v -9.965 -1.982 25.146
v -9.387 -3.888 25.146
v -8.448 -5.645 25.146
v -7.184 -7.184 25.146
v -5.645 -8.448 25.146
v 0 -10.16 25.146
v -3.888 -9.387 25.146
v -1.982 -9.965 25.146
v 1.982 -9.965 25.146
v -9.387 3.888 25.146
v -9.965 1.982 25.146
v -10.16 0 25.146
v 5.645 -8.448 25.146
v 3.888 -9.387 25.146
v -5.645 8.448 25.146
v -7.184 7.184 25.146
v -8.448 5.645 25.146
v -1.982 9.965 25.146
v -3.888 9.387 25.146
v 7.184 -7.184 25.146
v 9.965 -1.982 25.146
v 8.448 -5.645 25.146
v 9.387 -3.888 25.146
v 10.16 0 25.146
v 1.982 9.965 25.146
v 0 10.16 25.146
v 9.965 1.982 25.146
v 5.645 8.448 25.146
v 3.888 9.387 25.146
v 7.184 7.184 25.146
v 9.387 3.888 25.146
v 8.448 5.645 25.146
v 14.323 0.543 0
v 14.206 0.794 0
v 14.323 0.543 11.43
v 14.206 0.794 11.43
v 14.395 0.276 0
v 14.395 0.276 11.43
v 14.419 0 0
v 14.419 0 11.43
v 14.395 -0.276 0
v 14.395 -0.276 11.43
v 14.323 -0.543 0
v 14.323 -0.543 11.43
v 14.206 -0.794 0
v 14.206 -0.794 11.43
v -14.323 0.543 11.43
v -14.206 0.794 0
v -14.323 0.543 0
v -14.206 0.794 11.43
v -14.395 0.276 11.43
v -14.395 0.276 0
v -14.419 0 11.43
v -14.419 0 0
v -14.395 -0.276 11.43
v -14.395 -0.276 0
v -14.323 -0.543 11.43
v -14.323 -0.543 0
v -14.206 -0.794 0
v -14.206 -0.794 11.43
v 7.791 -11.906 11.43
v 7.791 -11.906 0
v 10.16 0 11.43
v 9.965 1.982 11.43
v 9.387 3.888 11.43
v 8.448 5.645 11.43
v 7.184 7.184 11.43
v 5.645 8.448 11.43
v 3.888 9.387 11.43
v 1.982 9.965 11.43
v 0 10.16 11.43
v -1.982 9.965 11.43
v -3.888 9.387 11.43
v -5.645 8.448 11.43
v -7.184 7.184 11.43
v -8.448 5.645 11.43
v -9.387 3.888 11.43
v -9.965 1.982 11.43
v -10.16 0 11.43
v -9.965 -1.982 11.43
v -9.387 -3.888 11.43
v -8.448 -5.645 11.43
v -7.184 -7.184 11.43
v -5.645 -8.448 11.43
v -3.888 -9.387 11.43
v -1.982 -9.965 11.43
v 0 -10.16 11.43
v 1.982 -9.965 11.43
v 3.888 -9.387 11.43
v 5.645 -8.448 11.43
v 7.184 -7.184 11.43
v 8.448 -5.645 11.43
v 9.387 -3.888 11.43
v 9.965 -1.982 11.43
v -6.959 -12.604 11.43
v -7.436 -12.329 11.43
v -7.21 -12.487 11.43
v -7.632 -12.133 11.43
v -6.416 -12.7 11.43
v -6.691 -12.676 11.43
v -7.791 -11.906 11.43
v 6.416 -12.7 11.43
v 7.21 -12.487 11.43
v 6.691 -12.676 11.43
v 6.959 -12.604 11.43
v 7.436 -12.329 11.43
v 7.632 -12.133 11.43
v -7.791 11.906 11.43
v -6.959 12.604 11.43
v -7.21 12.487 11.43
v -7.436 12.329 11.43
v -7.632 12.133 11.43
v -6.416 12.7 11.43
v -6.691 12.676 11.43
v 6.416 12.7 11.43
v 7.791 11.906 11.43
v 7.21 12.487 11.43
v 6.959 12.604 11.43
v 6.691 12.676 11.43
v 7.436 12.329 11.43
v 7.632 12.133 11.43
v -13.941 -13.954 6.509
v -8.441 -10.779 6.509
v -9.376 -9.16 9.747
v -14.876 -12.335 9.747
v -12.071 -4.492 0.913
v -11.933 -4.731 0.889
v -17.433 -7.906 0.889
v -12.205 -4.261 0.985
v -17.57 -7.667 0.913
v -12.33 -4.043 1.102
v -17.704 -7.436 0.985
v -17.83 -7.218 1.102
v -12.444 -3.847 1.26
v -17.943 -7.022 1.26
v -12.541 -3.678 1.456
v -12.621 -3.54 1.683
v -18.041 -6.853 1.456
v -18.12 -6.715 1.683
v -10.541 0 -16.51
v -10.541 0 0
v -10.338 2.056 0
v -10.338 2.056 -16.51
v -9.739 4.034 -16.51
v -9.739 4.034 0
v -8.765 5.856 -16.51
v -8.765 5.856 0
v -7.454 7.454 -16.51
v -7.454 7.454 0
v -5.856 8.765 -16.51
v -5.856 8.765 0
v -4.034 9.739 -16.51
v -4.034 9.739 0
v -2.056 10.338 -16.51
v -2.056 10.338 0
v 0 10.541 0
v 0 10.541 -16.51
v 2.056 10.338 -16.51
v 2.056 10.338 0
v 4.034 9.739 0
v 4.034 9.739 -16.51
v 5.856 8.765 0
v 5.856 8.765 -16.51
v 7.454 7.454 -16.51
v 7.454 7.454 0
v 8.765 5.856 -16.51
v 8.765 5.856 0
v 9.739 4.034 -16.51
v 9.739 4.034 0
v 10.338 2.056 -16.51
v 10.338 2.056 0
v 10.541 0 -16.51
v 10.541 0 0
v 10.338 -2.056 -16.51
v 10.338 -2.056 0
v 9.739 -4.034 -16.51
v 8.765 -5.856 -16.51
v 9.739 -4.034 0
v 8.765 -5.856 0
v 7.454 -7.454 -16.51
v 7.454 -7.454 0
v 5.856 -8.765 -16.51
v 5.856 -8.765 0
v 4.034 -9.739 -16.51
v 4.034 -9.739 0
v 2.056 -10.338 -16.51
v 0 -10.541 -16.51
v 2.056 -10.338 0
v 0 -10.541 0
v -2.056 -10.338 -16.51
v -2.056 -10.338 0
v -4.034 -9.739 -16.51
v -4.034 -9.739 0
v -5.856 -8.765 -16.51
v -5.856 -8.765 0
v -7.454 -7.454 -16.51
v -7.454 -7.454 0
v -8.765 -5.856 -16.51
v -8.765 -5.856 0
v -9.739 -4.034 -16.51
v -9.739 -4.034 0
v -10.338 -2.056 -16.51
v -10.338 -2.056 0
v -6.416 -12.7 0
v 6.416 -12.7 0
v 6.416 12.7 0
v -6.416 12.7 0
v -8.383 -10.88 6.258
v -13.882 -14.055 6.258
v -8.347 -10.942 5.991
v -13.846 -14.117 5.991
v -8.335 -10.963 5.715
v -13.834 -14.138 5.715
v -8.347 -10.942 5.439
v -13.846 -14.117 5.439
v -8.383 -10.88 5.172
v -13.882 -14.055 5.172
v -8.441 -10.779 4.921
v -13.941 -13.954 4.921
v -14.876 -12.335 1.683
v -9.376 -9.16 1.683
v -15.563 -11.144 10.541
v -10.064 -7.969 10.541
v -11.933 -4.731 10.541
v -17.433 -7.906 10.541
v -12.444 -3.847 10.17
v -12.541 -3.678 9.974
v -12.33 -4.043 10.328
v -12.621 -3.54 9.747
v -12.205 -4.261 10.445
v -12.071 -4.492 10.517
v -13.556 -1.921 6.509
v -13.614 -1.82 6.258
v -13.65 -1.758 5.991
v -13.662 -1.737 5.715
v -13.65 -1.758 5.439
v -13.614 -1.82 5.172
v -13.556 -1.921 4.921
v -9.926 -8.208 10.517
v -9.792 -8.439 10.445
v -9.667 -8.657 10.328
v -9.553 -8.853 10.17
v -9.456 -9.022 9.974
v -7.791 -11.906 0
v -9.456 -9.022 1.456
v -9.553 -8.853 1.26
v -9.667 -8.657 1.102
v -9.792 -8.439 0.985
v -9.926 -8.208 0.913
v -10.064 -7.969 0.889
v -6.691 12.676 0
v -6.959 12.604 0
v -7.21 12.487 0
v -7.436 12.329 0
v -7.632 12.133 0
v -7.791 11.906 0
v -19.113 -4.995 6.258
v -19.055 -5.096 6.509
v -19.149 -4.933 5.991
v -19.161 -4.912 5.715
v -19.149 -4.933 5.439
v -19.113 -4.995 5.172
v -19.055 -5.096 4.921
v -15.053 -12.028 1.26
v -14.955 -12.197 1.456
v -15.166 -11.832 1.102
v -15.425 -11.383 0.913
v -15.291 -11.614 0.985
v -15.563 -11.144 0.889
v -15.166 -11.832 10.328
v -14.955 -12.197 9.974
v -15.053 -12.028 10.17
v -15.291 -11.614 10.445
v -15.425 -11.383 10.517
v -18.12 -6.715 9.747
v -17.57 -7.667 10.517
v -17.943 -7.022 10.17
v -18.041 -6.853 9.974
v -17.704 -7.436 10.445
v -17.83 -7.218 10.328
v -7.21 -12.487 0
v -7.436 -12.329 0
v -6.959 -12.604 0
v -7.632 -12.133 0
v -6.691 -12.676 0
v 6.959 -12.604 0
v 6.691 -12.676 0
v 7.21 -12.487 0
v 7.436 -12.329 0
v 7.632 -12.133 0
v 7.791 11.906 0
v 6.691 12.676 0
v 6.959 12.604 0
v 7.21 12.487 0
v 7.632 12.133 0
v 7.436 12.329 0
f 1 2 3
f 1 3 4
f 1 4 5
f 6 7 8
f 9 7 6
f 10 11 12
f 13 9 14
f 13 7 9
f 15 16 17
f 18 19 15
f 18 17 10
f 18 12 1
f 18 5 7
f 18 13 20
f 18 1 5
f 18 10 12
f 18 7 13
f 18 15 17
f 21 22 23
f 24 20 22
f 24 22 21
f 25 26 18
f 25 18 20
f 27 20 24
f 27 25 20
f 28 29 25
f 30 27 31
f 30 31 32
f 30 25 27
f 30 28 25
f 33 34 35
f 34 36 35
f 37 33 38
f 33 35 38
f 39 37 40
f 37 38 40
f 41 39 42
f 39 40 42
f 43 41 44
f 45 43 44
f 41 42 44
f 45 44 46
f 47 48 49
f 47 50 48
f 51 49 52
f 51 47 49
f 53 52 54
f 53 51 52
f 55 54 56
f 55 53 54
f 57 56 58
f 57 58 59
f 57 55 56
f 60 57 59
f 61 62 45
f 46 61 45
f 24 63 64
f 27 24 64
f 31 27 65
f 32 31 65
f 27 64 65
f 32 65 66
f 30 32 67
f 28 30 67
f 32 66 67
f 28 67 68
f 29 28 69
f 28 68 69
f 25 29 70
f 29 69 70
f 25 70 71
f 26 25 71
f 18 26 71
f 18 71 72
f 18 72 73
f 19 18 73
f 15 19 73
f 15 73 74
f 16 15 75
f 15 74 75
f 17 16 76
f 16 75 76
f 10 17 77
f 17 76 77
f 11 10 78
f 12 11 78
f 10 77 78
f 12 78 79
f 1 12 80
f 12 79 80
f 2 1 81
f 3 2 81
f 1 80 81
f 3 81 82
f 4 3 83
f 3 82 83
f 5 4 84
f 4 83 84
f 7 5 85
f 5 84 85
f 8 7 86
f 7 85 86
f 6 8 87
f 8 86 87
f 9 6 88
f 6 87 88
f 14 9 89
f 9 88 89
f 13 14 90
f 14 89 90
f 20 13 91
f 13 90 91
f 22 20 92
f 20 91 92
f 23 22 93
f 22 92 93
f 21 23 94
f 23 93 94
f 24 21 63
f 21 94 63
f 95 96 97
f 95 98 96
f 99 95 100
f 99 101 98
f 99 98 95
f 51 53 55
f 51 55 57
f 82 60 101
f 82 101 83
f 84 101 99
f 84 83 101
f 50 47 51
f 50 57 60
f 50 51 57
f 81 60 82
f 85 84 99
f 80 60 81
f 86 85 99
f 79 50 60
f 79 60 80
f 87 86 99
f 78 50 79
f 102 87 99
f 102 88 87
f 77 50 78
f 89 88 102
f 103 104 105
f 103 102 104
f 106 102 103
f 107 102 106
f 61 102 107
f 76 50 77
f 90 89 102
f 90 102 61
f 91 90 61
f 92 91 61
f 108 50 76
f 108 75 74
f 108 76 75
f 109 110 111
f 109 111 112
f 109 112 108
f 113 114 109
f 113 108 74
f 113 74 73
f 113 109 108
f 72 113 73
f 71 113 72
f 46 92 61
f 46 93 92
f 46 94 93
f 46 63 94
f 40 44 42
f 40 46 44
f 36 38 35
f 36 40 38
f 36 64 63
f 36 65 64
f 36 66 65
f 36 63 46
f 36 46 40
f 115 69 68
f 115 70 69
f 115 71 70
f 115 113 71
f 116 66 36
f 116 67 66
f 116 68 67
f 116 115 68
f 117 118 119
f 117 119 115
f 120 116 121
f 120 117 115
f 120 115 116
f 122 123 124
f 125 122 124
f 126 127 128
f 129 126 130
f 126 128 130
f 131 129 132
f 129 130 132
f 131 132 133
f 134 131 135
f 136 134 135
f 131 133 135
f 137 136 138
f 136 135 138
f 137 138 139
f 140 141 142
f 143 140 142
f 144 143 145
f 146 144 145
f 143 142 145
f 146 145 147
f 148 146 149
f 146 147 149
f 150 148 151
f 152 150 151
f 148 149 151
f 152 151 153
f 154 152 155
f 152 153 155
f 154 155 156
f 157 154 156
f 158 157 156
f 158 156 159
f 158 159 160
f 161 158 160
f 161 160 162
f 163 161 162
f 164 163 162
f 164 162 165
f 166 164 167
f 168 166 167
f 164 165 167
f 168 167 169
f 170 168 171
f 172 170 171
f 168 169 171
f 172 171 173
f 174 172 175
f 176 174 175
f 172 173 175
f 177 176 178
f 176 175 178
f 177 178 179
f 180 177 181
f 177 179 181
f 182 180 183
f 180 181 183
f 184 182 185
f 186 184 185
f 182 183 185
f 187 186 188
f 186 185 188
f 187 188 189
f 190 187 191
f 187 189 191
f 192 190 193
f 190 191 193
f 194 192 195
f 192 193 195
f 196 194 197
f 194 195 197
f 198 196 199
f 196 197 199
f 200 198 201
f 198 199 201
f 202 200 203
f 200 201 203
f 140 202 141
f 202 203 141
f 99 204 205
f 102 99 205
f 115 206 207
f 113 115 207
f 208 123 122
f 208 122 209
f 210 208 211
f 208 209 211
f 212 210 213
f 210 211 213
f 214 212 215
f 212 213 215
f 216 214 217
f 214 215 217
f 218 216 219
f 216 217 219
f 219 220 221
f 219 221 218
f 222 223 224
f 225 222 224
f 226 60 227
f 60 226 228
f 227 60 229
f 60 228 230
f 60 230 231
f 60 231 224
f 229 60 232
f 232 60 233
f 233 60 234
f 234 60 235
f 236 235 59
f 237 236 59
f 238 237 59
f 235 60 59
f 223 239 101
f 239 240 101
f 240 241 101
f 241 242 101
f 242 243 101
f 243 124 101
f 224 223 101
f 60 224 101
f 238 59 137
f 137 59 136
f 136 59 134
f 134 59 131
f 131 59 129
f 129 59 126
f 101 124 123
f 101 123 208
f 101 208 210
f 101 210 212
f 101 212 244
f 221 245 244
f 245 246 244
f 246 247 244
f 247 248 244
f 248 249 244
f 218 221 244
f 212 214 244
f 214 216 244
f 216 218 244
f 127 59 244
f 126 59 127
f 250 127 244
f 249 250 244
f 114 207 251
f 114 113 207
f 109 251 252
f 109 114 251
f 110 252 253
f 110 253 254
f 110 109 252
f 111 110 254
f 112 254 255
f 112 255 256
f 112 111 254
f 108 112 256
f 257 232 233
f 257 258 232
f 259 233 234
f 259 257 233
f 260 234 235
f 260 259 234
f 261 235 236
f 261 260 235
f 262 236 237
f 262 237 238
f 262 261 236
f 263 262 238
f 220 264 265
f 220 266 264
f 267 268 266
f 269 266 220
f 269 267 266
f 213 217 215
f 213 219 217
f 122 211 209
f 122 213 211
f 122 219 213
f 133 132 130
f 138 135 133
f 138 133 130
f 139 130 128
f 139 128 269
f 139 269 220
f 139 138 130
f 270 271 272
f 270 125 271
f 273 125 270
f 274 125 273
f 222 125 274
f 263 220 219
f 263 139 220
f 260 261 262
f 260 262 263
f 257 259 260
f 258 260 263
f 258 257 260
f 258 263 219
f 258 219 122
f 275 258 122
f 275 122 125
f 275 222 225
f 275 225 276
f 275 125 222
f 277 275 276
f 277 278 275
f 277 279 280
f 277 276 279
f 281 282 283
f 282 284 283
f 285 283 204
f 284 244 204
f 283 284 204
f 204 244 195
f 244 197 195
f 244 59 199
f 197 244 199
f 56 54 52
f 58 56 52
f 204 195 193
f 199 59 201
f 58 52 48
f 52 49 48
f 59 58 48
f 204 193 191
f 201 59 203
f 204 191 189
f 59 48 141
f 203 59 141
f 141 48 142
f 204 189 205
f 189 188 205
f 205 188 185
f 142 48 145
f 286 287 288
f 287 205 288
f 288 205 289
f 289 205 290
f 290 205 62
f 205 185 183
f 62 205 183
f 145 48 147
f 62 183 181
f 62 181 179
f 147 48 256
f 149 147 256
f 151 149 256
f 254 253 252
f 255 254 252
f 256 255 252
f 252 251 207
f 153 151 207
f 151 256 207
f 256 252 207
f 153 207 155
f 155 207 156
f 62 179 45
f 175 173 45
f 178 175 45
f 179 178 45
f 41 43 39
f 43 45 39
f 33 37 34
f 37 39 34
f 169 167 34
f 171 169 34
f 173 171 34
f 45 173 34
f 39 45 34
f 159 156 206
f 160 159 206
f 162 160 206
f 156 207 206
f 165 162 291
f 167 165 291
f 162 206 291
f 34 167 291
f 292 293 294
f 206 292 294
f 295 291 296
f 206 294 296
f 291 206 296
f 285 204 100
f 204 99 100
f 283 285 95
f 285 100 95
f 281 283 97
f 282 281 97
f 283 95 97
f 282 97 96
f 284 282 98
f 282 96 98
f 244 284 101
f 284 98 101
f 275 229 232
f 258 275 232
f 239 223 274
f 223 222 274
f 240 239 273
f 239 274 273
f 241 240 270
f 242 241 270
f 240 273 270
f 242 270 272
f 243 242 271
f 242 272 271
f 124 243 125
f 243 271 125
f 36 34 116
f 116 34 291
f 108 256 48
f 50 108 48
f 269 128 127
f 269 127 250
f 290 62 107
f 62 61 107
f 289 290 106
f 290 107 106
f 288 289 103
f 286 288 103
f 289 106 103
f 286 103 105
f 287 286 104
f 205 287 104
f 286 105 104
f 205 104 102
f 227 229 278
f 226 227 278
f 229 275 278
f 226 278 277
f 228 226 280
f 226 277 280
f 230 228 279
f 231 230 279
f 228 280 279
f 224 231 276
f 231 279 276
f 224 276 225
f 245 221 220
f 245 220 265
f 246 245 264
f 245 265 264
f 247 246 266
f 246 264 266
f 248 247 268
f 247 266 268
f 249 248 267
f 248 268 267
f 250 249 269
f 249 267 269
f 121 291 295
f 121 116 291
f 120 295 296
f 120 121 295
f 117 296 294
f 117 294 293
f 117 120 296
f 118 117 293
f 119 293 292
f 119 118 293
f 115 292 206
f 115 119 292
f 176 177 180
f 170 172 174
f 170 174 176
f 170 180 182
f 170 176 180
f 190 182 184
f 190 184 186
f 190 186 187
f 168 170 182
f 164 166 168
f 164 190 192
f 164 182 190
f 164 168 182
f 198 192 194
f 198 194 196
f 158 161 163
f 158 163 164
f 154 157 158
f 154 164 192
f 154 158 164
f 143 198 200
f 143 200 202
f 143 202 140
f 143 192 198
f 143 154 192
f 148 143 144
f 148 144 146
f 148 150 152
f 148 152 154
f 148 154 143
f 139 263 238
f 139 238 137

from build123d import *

# Parameters (mm, degrees)
BOSS_EXTRUDE1_DEPTH = 11.43
BOSS_EXTRUDE2_DEPTH = 6.35
SKETCH6_R           = 10.16
BOSS_EXTRUDE3_DEPTH = 13.716
SKETCH7_R           = 10.541
BOSS_EXTRUDE4_DEPTH = 16.51
FILLET1_R           = 1.5875
FILLET2_R           = 1.5875


with BuildPart() as part:
    # Sketch1 → Boss-Extrude1 (new body)
    with BuildSketch(Plane.XY):
        Polygon((14.664696837, 0), (7.332348419, 12.7), (-7.332348419, 12.7), (-14.664696837, 0), (-7.332348419, -12.7), (7.332348419, -12.7), align=None)
    extrude(amount=BOSS_EXTRUDE1_DEPTH)

    # Sketch4 → Boss-Extrude2 (add)
    with BuildSketch(Plane(origin=(-10.998522628, -6.35, 0), x_dir=(0, 0, 1), z_dir=(-0.866025404, -0.5, 0))):
        Polygon((5.715, 0), (5.715, 5.572584798), (0.889, 2.786292399), (0.889, 0), align=None)
        Polygon((5.715, -5.572584798), (5.715, 0), (0.889, 0), (0.889, -2.786292399), align=None)
        Polygon((10.541, 0), (5.715, 0), (5.715, -5.572584798), (10.541, -2.786292399), align=None)
        Polygon((10.541, 2.786292399), (5.715, 5.572584798), (5.715, 0), (10.541, 0), align=None)
    extrude(amount=BOSS_EXTRUDE2_DEPTH)

    # Sketch6 → Boss-Extrude3 (add)
    with BuildSketch(Plane.XY.offset(11.43)):
        Circle(SKETCH6_R)
    extrude(amount=BOSS_EXTRUDE3_DEPTH)

    # Sketch7 → Boss-Extrude4 (add)
    with BuildSketch(Plane(origin=(0, 0, 0), x_dir=(-1, 0, 0), z_dir=(0, 0, -1))):
        Circle(SKETCH7_R)
    extrude(amount=BOSS_EXTRUDE4_DEPTH)

    # Fillet1
    fillet1_edges = [part.edges().sort_by_distance(p)[0] for p in [
        (7.332348419, -12.7, 5.715),
        (-7.332348419, -12.7, 5.715),
        (-14.664696837, 0, 5.715),
        (-7.332348419, 12.7, 5.715),
        (7.332348419, 12.7, 5.715),
        (14.664696837, 0, 5.715),
    ]]
    fillet(fillet1_edges, radius=FILLET1_R)

    # Fillet2
    fillet2_edges = [part.edges().sort_by_distance(p)[0] for p in [
        (-12.355007086, -10.3505, 0.889),
        (-10.961860886, -12.7635, 5.715),
        (-12.355007086, -10.3505, 10.541),
        (-15.141299485, -5.5245, 10.541),
        (-16.534445684, -3.1115, 5.715),
        (-15.141299485, -5.5245, 0.889),
    ]]
    fillet(fillet2_edges, radius=FILLET2_R)


solid = part.part
